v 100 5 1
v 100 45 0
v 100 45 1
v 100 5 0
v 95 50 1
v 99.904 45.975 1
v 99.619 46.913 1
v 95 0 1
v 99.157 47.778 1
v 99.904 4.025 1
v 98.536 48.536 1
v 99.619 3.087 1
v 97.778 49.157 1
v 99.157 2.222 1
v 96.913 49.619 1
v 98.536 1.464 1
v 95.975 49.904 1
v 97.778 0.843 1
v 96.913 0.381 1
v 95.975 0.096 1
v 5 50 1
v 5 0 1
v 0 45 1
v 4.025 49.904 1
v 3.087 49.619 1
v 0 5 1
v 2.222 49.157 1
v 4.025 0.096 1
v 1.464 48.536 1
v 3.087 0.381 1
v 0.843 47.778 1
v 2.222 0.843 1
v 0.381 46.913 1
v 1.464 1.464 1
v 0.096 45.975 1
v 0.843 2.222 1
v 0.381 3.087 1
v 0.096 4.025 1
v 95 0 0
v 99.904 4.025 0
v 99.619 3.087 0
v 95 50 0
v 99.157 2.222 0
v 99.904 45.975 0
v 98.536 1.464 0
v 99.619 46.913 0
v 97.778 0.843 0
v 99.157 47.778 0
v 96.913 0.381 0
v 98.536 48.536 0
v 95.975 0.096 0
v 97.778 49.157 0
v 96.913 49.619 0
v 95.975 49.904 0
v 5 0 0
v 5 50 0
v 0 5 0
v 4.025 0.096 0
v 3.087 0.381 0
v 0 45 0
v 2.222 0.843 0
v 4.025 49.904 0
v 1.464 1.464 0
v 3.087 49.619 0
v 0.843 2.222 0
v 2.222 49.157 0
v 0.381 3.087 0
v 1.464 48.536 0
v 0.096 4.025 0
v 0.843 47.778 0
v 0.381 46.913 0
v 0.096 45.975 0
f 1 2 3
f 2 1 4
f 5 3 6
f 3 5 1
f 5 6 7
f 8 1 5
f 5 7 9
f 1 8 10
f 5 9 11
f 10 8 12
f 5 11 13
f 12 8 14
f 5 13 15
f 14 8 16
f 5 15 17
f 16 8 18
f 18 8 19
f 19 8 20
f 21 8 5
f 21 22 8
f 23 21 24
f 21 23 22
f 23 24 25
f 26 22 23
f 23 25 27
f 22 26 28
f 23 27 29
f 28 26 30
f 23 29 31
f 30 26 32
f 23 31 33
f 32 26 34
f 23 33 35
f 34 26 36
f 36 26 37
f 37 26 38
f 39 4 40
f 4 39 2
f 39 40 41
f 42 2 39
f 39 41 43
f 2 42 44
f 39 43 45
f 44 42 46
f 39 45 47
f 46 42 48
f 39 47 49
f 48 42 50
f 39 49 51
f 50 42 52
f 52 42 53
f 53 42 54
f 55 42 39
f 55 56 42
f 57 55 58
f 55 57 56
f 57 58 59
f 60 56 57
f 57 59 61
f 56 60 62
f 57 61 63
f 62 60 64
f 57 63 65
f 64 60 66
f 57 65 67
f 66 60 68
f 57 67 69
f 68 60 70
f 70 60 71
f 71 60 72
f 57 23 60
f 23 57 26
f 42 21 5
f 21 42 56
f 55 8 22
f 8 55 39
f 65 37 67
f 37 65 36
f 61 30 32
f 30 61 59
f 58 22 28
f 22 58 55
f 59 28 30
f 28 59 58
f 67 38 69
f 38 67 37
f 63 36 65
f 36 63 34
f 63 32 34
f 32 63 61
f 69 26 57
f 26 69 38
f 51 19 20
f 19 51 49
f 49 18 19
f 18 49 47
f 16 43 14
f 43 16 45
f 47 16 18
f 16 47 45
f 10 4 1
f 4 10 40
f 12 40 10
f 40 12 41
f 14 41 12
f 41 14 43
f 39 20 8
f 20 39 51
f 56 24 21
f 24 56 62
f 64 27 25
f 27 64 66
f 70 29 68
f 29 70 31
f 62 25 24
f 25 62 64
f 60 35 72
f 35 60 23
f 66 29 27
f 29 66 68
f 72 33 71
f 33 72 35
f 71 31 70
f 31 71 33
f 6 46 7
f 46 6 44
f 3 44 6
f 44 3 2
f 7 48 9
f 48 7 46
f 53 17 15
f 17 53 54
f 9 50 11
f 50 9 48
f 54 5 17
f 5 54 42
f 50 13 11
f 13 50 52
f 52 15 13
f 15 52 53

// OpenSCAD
// [FL_INDEX: keywords="openscad, 3d_parametric, parametric_rounded_corner_plate, csg_solid" | COT="Parametric OpenSCAD design from 3DCodeverse"]
// Title: parametric rounded corner plate


size_x=100;
size_y=50;
size_z=1;
corner_radius=5;
corner_faces=32;



module plate (sizeX, sizeY, sizeZ, cornerRadius, cornerFaces)
{
	union()
	{
		difference()
		{
			cube([sizeX,sizeY,sizeZ]);		
			cube([cornerRadius,cornerRadius,	sizeZ+1]);
			translate([sizeX-cornerRadius,0,0]) cube([cornerRadius,cornerRadius,sizeZ+1]);
			translate([0,sizeY-cornerRadius,0]) cube([cornerRadius,cornerRadius,sizeZ+1]);
			translate([sizeX-cornerRadius,sizeY-cornerRadius,0]) cube([cornerRadius,cornerRadius,sizeZ+1]);
		}
		translate([cornerRadius,cornerRadius,0]) cylinder(r=cornerRadius,h=sizeZ, $fn=cornerFaces);
		translate([sizeX-cornerRadius,cornerRadius,0]) cylinder(r=cornerRadius,h=sizeZ, $fn=cornerFaces);
		translate([cornerRadius,sizeY-cornerRadius,0]) cylinder(r=cornerRadius,h=sizeZ, $fn=cornerFaces);
		translate([sizeX-cornerRadius,sizeY-cornerRadius,0]) cylinder(r=cornerRadius,h=sizeZ, $fn=cornerFaces);
	}
}

plate (size_x, size_y, size_z, corner_radius, corner_faces);
